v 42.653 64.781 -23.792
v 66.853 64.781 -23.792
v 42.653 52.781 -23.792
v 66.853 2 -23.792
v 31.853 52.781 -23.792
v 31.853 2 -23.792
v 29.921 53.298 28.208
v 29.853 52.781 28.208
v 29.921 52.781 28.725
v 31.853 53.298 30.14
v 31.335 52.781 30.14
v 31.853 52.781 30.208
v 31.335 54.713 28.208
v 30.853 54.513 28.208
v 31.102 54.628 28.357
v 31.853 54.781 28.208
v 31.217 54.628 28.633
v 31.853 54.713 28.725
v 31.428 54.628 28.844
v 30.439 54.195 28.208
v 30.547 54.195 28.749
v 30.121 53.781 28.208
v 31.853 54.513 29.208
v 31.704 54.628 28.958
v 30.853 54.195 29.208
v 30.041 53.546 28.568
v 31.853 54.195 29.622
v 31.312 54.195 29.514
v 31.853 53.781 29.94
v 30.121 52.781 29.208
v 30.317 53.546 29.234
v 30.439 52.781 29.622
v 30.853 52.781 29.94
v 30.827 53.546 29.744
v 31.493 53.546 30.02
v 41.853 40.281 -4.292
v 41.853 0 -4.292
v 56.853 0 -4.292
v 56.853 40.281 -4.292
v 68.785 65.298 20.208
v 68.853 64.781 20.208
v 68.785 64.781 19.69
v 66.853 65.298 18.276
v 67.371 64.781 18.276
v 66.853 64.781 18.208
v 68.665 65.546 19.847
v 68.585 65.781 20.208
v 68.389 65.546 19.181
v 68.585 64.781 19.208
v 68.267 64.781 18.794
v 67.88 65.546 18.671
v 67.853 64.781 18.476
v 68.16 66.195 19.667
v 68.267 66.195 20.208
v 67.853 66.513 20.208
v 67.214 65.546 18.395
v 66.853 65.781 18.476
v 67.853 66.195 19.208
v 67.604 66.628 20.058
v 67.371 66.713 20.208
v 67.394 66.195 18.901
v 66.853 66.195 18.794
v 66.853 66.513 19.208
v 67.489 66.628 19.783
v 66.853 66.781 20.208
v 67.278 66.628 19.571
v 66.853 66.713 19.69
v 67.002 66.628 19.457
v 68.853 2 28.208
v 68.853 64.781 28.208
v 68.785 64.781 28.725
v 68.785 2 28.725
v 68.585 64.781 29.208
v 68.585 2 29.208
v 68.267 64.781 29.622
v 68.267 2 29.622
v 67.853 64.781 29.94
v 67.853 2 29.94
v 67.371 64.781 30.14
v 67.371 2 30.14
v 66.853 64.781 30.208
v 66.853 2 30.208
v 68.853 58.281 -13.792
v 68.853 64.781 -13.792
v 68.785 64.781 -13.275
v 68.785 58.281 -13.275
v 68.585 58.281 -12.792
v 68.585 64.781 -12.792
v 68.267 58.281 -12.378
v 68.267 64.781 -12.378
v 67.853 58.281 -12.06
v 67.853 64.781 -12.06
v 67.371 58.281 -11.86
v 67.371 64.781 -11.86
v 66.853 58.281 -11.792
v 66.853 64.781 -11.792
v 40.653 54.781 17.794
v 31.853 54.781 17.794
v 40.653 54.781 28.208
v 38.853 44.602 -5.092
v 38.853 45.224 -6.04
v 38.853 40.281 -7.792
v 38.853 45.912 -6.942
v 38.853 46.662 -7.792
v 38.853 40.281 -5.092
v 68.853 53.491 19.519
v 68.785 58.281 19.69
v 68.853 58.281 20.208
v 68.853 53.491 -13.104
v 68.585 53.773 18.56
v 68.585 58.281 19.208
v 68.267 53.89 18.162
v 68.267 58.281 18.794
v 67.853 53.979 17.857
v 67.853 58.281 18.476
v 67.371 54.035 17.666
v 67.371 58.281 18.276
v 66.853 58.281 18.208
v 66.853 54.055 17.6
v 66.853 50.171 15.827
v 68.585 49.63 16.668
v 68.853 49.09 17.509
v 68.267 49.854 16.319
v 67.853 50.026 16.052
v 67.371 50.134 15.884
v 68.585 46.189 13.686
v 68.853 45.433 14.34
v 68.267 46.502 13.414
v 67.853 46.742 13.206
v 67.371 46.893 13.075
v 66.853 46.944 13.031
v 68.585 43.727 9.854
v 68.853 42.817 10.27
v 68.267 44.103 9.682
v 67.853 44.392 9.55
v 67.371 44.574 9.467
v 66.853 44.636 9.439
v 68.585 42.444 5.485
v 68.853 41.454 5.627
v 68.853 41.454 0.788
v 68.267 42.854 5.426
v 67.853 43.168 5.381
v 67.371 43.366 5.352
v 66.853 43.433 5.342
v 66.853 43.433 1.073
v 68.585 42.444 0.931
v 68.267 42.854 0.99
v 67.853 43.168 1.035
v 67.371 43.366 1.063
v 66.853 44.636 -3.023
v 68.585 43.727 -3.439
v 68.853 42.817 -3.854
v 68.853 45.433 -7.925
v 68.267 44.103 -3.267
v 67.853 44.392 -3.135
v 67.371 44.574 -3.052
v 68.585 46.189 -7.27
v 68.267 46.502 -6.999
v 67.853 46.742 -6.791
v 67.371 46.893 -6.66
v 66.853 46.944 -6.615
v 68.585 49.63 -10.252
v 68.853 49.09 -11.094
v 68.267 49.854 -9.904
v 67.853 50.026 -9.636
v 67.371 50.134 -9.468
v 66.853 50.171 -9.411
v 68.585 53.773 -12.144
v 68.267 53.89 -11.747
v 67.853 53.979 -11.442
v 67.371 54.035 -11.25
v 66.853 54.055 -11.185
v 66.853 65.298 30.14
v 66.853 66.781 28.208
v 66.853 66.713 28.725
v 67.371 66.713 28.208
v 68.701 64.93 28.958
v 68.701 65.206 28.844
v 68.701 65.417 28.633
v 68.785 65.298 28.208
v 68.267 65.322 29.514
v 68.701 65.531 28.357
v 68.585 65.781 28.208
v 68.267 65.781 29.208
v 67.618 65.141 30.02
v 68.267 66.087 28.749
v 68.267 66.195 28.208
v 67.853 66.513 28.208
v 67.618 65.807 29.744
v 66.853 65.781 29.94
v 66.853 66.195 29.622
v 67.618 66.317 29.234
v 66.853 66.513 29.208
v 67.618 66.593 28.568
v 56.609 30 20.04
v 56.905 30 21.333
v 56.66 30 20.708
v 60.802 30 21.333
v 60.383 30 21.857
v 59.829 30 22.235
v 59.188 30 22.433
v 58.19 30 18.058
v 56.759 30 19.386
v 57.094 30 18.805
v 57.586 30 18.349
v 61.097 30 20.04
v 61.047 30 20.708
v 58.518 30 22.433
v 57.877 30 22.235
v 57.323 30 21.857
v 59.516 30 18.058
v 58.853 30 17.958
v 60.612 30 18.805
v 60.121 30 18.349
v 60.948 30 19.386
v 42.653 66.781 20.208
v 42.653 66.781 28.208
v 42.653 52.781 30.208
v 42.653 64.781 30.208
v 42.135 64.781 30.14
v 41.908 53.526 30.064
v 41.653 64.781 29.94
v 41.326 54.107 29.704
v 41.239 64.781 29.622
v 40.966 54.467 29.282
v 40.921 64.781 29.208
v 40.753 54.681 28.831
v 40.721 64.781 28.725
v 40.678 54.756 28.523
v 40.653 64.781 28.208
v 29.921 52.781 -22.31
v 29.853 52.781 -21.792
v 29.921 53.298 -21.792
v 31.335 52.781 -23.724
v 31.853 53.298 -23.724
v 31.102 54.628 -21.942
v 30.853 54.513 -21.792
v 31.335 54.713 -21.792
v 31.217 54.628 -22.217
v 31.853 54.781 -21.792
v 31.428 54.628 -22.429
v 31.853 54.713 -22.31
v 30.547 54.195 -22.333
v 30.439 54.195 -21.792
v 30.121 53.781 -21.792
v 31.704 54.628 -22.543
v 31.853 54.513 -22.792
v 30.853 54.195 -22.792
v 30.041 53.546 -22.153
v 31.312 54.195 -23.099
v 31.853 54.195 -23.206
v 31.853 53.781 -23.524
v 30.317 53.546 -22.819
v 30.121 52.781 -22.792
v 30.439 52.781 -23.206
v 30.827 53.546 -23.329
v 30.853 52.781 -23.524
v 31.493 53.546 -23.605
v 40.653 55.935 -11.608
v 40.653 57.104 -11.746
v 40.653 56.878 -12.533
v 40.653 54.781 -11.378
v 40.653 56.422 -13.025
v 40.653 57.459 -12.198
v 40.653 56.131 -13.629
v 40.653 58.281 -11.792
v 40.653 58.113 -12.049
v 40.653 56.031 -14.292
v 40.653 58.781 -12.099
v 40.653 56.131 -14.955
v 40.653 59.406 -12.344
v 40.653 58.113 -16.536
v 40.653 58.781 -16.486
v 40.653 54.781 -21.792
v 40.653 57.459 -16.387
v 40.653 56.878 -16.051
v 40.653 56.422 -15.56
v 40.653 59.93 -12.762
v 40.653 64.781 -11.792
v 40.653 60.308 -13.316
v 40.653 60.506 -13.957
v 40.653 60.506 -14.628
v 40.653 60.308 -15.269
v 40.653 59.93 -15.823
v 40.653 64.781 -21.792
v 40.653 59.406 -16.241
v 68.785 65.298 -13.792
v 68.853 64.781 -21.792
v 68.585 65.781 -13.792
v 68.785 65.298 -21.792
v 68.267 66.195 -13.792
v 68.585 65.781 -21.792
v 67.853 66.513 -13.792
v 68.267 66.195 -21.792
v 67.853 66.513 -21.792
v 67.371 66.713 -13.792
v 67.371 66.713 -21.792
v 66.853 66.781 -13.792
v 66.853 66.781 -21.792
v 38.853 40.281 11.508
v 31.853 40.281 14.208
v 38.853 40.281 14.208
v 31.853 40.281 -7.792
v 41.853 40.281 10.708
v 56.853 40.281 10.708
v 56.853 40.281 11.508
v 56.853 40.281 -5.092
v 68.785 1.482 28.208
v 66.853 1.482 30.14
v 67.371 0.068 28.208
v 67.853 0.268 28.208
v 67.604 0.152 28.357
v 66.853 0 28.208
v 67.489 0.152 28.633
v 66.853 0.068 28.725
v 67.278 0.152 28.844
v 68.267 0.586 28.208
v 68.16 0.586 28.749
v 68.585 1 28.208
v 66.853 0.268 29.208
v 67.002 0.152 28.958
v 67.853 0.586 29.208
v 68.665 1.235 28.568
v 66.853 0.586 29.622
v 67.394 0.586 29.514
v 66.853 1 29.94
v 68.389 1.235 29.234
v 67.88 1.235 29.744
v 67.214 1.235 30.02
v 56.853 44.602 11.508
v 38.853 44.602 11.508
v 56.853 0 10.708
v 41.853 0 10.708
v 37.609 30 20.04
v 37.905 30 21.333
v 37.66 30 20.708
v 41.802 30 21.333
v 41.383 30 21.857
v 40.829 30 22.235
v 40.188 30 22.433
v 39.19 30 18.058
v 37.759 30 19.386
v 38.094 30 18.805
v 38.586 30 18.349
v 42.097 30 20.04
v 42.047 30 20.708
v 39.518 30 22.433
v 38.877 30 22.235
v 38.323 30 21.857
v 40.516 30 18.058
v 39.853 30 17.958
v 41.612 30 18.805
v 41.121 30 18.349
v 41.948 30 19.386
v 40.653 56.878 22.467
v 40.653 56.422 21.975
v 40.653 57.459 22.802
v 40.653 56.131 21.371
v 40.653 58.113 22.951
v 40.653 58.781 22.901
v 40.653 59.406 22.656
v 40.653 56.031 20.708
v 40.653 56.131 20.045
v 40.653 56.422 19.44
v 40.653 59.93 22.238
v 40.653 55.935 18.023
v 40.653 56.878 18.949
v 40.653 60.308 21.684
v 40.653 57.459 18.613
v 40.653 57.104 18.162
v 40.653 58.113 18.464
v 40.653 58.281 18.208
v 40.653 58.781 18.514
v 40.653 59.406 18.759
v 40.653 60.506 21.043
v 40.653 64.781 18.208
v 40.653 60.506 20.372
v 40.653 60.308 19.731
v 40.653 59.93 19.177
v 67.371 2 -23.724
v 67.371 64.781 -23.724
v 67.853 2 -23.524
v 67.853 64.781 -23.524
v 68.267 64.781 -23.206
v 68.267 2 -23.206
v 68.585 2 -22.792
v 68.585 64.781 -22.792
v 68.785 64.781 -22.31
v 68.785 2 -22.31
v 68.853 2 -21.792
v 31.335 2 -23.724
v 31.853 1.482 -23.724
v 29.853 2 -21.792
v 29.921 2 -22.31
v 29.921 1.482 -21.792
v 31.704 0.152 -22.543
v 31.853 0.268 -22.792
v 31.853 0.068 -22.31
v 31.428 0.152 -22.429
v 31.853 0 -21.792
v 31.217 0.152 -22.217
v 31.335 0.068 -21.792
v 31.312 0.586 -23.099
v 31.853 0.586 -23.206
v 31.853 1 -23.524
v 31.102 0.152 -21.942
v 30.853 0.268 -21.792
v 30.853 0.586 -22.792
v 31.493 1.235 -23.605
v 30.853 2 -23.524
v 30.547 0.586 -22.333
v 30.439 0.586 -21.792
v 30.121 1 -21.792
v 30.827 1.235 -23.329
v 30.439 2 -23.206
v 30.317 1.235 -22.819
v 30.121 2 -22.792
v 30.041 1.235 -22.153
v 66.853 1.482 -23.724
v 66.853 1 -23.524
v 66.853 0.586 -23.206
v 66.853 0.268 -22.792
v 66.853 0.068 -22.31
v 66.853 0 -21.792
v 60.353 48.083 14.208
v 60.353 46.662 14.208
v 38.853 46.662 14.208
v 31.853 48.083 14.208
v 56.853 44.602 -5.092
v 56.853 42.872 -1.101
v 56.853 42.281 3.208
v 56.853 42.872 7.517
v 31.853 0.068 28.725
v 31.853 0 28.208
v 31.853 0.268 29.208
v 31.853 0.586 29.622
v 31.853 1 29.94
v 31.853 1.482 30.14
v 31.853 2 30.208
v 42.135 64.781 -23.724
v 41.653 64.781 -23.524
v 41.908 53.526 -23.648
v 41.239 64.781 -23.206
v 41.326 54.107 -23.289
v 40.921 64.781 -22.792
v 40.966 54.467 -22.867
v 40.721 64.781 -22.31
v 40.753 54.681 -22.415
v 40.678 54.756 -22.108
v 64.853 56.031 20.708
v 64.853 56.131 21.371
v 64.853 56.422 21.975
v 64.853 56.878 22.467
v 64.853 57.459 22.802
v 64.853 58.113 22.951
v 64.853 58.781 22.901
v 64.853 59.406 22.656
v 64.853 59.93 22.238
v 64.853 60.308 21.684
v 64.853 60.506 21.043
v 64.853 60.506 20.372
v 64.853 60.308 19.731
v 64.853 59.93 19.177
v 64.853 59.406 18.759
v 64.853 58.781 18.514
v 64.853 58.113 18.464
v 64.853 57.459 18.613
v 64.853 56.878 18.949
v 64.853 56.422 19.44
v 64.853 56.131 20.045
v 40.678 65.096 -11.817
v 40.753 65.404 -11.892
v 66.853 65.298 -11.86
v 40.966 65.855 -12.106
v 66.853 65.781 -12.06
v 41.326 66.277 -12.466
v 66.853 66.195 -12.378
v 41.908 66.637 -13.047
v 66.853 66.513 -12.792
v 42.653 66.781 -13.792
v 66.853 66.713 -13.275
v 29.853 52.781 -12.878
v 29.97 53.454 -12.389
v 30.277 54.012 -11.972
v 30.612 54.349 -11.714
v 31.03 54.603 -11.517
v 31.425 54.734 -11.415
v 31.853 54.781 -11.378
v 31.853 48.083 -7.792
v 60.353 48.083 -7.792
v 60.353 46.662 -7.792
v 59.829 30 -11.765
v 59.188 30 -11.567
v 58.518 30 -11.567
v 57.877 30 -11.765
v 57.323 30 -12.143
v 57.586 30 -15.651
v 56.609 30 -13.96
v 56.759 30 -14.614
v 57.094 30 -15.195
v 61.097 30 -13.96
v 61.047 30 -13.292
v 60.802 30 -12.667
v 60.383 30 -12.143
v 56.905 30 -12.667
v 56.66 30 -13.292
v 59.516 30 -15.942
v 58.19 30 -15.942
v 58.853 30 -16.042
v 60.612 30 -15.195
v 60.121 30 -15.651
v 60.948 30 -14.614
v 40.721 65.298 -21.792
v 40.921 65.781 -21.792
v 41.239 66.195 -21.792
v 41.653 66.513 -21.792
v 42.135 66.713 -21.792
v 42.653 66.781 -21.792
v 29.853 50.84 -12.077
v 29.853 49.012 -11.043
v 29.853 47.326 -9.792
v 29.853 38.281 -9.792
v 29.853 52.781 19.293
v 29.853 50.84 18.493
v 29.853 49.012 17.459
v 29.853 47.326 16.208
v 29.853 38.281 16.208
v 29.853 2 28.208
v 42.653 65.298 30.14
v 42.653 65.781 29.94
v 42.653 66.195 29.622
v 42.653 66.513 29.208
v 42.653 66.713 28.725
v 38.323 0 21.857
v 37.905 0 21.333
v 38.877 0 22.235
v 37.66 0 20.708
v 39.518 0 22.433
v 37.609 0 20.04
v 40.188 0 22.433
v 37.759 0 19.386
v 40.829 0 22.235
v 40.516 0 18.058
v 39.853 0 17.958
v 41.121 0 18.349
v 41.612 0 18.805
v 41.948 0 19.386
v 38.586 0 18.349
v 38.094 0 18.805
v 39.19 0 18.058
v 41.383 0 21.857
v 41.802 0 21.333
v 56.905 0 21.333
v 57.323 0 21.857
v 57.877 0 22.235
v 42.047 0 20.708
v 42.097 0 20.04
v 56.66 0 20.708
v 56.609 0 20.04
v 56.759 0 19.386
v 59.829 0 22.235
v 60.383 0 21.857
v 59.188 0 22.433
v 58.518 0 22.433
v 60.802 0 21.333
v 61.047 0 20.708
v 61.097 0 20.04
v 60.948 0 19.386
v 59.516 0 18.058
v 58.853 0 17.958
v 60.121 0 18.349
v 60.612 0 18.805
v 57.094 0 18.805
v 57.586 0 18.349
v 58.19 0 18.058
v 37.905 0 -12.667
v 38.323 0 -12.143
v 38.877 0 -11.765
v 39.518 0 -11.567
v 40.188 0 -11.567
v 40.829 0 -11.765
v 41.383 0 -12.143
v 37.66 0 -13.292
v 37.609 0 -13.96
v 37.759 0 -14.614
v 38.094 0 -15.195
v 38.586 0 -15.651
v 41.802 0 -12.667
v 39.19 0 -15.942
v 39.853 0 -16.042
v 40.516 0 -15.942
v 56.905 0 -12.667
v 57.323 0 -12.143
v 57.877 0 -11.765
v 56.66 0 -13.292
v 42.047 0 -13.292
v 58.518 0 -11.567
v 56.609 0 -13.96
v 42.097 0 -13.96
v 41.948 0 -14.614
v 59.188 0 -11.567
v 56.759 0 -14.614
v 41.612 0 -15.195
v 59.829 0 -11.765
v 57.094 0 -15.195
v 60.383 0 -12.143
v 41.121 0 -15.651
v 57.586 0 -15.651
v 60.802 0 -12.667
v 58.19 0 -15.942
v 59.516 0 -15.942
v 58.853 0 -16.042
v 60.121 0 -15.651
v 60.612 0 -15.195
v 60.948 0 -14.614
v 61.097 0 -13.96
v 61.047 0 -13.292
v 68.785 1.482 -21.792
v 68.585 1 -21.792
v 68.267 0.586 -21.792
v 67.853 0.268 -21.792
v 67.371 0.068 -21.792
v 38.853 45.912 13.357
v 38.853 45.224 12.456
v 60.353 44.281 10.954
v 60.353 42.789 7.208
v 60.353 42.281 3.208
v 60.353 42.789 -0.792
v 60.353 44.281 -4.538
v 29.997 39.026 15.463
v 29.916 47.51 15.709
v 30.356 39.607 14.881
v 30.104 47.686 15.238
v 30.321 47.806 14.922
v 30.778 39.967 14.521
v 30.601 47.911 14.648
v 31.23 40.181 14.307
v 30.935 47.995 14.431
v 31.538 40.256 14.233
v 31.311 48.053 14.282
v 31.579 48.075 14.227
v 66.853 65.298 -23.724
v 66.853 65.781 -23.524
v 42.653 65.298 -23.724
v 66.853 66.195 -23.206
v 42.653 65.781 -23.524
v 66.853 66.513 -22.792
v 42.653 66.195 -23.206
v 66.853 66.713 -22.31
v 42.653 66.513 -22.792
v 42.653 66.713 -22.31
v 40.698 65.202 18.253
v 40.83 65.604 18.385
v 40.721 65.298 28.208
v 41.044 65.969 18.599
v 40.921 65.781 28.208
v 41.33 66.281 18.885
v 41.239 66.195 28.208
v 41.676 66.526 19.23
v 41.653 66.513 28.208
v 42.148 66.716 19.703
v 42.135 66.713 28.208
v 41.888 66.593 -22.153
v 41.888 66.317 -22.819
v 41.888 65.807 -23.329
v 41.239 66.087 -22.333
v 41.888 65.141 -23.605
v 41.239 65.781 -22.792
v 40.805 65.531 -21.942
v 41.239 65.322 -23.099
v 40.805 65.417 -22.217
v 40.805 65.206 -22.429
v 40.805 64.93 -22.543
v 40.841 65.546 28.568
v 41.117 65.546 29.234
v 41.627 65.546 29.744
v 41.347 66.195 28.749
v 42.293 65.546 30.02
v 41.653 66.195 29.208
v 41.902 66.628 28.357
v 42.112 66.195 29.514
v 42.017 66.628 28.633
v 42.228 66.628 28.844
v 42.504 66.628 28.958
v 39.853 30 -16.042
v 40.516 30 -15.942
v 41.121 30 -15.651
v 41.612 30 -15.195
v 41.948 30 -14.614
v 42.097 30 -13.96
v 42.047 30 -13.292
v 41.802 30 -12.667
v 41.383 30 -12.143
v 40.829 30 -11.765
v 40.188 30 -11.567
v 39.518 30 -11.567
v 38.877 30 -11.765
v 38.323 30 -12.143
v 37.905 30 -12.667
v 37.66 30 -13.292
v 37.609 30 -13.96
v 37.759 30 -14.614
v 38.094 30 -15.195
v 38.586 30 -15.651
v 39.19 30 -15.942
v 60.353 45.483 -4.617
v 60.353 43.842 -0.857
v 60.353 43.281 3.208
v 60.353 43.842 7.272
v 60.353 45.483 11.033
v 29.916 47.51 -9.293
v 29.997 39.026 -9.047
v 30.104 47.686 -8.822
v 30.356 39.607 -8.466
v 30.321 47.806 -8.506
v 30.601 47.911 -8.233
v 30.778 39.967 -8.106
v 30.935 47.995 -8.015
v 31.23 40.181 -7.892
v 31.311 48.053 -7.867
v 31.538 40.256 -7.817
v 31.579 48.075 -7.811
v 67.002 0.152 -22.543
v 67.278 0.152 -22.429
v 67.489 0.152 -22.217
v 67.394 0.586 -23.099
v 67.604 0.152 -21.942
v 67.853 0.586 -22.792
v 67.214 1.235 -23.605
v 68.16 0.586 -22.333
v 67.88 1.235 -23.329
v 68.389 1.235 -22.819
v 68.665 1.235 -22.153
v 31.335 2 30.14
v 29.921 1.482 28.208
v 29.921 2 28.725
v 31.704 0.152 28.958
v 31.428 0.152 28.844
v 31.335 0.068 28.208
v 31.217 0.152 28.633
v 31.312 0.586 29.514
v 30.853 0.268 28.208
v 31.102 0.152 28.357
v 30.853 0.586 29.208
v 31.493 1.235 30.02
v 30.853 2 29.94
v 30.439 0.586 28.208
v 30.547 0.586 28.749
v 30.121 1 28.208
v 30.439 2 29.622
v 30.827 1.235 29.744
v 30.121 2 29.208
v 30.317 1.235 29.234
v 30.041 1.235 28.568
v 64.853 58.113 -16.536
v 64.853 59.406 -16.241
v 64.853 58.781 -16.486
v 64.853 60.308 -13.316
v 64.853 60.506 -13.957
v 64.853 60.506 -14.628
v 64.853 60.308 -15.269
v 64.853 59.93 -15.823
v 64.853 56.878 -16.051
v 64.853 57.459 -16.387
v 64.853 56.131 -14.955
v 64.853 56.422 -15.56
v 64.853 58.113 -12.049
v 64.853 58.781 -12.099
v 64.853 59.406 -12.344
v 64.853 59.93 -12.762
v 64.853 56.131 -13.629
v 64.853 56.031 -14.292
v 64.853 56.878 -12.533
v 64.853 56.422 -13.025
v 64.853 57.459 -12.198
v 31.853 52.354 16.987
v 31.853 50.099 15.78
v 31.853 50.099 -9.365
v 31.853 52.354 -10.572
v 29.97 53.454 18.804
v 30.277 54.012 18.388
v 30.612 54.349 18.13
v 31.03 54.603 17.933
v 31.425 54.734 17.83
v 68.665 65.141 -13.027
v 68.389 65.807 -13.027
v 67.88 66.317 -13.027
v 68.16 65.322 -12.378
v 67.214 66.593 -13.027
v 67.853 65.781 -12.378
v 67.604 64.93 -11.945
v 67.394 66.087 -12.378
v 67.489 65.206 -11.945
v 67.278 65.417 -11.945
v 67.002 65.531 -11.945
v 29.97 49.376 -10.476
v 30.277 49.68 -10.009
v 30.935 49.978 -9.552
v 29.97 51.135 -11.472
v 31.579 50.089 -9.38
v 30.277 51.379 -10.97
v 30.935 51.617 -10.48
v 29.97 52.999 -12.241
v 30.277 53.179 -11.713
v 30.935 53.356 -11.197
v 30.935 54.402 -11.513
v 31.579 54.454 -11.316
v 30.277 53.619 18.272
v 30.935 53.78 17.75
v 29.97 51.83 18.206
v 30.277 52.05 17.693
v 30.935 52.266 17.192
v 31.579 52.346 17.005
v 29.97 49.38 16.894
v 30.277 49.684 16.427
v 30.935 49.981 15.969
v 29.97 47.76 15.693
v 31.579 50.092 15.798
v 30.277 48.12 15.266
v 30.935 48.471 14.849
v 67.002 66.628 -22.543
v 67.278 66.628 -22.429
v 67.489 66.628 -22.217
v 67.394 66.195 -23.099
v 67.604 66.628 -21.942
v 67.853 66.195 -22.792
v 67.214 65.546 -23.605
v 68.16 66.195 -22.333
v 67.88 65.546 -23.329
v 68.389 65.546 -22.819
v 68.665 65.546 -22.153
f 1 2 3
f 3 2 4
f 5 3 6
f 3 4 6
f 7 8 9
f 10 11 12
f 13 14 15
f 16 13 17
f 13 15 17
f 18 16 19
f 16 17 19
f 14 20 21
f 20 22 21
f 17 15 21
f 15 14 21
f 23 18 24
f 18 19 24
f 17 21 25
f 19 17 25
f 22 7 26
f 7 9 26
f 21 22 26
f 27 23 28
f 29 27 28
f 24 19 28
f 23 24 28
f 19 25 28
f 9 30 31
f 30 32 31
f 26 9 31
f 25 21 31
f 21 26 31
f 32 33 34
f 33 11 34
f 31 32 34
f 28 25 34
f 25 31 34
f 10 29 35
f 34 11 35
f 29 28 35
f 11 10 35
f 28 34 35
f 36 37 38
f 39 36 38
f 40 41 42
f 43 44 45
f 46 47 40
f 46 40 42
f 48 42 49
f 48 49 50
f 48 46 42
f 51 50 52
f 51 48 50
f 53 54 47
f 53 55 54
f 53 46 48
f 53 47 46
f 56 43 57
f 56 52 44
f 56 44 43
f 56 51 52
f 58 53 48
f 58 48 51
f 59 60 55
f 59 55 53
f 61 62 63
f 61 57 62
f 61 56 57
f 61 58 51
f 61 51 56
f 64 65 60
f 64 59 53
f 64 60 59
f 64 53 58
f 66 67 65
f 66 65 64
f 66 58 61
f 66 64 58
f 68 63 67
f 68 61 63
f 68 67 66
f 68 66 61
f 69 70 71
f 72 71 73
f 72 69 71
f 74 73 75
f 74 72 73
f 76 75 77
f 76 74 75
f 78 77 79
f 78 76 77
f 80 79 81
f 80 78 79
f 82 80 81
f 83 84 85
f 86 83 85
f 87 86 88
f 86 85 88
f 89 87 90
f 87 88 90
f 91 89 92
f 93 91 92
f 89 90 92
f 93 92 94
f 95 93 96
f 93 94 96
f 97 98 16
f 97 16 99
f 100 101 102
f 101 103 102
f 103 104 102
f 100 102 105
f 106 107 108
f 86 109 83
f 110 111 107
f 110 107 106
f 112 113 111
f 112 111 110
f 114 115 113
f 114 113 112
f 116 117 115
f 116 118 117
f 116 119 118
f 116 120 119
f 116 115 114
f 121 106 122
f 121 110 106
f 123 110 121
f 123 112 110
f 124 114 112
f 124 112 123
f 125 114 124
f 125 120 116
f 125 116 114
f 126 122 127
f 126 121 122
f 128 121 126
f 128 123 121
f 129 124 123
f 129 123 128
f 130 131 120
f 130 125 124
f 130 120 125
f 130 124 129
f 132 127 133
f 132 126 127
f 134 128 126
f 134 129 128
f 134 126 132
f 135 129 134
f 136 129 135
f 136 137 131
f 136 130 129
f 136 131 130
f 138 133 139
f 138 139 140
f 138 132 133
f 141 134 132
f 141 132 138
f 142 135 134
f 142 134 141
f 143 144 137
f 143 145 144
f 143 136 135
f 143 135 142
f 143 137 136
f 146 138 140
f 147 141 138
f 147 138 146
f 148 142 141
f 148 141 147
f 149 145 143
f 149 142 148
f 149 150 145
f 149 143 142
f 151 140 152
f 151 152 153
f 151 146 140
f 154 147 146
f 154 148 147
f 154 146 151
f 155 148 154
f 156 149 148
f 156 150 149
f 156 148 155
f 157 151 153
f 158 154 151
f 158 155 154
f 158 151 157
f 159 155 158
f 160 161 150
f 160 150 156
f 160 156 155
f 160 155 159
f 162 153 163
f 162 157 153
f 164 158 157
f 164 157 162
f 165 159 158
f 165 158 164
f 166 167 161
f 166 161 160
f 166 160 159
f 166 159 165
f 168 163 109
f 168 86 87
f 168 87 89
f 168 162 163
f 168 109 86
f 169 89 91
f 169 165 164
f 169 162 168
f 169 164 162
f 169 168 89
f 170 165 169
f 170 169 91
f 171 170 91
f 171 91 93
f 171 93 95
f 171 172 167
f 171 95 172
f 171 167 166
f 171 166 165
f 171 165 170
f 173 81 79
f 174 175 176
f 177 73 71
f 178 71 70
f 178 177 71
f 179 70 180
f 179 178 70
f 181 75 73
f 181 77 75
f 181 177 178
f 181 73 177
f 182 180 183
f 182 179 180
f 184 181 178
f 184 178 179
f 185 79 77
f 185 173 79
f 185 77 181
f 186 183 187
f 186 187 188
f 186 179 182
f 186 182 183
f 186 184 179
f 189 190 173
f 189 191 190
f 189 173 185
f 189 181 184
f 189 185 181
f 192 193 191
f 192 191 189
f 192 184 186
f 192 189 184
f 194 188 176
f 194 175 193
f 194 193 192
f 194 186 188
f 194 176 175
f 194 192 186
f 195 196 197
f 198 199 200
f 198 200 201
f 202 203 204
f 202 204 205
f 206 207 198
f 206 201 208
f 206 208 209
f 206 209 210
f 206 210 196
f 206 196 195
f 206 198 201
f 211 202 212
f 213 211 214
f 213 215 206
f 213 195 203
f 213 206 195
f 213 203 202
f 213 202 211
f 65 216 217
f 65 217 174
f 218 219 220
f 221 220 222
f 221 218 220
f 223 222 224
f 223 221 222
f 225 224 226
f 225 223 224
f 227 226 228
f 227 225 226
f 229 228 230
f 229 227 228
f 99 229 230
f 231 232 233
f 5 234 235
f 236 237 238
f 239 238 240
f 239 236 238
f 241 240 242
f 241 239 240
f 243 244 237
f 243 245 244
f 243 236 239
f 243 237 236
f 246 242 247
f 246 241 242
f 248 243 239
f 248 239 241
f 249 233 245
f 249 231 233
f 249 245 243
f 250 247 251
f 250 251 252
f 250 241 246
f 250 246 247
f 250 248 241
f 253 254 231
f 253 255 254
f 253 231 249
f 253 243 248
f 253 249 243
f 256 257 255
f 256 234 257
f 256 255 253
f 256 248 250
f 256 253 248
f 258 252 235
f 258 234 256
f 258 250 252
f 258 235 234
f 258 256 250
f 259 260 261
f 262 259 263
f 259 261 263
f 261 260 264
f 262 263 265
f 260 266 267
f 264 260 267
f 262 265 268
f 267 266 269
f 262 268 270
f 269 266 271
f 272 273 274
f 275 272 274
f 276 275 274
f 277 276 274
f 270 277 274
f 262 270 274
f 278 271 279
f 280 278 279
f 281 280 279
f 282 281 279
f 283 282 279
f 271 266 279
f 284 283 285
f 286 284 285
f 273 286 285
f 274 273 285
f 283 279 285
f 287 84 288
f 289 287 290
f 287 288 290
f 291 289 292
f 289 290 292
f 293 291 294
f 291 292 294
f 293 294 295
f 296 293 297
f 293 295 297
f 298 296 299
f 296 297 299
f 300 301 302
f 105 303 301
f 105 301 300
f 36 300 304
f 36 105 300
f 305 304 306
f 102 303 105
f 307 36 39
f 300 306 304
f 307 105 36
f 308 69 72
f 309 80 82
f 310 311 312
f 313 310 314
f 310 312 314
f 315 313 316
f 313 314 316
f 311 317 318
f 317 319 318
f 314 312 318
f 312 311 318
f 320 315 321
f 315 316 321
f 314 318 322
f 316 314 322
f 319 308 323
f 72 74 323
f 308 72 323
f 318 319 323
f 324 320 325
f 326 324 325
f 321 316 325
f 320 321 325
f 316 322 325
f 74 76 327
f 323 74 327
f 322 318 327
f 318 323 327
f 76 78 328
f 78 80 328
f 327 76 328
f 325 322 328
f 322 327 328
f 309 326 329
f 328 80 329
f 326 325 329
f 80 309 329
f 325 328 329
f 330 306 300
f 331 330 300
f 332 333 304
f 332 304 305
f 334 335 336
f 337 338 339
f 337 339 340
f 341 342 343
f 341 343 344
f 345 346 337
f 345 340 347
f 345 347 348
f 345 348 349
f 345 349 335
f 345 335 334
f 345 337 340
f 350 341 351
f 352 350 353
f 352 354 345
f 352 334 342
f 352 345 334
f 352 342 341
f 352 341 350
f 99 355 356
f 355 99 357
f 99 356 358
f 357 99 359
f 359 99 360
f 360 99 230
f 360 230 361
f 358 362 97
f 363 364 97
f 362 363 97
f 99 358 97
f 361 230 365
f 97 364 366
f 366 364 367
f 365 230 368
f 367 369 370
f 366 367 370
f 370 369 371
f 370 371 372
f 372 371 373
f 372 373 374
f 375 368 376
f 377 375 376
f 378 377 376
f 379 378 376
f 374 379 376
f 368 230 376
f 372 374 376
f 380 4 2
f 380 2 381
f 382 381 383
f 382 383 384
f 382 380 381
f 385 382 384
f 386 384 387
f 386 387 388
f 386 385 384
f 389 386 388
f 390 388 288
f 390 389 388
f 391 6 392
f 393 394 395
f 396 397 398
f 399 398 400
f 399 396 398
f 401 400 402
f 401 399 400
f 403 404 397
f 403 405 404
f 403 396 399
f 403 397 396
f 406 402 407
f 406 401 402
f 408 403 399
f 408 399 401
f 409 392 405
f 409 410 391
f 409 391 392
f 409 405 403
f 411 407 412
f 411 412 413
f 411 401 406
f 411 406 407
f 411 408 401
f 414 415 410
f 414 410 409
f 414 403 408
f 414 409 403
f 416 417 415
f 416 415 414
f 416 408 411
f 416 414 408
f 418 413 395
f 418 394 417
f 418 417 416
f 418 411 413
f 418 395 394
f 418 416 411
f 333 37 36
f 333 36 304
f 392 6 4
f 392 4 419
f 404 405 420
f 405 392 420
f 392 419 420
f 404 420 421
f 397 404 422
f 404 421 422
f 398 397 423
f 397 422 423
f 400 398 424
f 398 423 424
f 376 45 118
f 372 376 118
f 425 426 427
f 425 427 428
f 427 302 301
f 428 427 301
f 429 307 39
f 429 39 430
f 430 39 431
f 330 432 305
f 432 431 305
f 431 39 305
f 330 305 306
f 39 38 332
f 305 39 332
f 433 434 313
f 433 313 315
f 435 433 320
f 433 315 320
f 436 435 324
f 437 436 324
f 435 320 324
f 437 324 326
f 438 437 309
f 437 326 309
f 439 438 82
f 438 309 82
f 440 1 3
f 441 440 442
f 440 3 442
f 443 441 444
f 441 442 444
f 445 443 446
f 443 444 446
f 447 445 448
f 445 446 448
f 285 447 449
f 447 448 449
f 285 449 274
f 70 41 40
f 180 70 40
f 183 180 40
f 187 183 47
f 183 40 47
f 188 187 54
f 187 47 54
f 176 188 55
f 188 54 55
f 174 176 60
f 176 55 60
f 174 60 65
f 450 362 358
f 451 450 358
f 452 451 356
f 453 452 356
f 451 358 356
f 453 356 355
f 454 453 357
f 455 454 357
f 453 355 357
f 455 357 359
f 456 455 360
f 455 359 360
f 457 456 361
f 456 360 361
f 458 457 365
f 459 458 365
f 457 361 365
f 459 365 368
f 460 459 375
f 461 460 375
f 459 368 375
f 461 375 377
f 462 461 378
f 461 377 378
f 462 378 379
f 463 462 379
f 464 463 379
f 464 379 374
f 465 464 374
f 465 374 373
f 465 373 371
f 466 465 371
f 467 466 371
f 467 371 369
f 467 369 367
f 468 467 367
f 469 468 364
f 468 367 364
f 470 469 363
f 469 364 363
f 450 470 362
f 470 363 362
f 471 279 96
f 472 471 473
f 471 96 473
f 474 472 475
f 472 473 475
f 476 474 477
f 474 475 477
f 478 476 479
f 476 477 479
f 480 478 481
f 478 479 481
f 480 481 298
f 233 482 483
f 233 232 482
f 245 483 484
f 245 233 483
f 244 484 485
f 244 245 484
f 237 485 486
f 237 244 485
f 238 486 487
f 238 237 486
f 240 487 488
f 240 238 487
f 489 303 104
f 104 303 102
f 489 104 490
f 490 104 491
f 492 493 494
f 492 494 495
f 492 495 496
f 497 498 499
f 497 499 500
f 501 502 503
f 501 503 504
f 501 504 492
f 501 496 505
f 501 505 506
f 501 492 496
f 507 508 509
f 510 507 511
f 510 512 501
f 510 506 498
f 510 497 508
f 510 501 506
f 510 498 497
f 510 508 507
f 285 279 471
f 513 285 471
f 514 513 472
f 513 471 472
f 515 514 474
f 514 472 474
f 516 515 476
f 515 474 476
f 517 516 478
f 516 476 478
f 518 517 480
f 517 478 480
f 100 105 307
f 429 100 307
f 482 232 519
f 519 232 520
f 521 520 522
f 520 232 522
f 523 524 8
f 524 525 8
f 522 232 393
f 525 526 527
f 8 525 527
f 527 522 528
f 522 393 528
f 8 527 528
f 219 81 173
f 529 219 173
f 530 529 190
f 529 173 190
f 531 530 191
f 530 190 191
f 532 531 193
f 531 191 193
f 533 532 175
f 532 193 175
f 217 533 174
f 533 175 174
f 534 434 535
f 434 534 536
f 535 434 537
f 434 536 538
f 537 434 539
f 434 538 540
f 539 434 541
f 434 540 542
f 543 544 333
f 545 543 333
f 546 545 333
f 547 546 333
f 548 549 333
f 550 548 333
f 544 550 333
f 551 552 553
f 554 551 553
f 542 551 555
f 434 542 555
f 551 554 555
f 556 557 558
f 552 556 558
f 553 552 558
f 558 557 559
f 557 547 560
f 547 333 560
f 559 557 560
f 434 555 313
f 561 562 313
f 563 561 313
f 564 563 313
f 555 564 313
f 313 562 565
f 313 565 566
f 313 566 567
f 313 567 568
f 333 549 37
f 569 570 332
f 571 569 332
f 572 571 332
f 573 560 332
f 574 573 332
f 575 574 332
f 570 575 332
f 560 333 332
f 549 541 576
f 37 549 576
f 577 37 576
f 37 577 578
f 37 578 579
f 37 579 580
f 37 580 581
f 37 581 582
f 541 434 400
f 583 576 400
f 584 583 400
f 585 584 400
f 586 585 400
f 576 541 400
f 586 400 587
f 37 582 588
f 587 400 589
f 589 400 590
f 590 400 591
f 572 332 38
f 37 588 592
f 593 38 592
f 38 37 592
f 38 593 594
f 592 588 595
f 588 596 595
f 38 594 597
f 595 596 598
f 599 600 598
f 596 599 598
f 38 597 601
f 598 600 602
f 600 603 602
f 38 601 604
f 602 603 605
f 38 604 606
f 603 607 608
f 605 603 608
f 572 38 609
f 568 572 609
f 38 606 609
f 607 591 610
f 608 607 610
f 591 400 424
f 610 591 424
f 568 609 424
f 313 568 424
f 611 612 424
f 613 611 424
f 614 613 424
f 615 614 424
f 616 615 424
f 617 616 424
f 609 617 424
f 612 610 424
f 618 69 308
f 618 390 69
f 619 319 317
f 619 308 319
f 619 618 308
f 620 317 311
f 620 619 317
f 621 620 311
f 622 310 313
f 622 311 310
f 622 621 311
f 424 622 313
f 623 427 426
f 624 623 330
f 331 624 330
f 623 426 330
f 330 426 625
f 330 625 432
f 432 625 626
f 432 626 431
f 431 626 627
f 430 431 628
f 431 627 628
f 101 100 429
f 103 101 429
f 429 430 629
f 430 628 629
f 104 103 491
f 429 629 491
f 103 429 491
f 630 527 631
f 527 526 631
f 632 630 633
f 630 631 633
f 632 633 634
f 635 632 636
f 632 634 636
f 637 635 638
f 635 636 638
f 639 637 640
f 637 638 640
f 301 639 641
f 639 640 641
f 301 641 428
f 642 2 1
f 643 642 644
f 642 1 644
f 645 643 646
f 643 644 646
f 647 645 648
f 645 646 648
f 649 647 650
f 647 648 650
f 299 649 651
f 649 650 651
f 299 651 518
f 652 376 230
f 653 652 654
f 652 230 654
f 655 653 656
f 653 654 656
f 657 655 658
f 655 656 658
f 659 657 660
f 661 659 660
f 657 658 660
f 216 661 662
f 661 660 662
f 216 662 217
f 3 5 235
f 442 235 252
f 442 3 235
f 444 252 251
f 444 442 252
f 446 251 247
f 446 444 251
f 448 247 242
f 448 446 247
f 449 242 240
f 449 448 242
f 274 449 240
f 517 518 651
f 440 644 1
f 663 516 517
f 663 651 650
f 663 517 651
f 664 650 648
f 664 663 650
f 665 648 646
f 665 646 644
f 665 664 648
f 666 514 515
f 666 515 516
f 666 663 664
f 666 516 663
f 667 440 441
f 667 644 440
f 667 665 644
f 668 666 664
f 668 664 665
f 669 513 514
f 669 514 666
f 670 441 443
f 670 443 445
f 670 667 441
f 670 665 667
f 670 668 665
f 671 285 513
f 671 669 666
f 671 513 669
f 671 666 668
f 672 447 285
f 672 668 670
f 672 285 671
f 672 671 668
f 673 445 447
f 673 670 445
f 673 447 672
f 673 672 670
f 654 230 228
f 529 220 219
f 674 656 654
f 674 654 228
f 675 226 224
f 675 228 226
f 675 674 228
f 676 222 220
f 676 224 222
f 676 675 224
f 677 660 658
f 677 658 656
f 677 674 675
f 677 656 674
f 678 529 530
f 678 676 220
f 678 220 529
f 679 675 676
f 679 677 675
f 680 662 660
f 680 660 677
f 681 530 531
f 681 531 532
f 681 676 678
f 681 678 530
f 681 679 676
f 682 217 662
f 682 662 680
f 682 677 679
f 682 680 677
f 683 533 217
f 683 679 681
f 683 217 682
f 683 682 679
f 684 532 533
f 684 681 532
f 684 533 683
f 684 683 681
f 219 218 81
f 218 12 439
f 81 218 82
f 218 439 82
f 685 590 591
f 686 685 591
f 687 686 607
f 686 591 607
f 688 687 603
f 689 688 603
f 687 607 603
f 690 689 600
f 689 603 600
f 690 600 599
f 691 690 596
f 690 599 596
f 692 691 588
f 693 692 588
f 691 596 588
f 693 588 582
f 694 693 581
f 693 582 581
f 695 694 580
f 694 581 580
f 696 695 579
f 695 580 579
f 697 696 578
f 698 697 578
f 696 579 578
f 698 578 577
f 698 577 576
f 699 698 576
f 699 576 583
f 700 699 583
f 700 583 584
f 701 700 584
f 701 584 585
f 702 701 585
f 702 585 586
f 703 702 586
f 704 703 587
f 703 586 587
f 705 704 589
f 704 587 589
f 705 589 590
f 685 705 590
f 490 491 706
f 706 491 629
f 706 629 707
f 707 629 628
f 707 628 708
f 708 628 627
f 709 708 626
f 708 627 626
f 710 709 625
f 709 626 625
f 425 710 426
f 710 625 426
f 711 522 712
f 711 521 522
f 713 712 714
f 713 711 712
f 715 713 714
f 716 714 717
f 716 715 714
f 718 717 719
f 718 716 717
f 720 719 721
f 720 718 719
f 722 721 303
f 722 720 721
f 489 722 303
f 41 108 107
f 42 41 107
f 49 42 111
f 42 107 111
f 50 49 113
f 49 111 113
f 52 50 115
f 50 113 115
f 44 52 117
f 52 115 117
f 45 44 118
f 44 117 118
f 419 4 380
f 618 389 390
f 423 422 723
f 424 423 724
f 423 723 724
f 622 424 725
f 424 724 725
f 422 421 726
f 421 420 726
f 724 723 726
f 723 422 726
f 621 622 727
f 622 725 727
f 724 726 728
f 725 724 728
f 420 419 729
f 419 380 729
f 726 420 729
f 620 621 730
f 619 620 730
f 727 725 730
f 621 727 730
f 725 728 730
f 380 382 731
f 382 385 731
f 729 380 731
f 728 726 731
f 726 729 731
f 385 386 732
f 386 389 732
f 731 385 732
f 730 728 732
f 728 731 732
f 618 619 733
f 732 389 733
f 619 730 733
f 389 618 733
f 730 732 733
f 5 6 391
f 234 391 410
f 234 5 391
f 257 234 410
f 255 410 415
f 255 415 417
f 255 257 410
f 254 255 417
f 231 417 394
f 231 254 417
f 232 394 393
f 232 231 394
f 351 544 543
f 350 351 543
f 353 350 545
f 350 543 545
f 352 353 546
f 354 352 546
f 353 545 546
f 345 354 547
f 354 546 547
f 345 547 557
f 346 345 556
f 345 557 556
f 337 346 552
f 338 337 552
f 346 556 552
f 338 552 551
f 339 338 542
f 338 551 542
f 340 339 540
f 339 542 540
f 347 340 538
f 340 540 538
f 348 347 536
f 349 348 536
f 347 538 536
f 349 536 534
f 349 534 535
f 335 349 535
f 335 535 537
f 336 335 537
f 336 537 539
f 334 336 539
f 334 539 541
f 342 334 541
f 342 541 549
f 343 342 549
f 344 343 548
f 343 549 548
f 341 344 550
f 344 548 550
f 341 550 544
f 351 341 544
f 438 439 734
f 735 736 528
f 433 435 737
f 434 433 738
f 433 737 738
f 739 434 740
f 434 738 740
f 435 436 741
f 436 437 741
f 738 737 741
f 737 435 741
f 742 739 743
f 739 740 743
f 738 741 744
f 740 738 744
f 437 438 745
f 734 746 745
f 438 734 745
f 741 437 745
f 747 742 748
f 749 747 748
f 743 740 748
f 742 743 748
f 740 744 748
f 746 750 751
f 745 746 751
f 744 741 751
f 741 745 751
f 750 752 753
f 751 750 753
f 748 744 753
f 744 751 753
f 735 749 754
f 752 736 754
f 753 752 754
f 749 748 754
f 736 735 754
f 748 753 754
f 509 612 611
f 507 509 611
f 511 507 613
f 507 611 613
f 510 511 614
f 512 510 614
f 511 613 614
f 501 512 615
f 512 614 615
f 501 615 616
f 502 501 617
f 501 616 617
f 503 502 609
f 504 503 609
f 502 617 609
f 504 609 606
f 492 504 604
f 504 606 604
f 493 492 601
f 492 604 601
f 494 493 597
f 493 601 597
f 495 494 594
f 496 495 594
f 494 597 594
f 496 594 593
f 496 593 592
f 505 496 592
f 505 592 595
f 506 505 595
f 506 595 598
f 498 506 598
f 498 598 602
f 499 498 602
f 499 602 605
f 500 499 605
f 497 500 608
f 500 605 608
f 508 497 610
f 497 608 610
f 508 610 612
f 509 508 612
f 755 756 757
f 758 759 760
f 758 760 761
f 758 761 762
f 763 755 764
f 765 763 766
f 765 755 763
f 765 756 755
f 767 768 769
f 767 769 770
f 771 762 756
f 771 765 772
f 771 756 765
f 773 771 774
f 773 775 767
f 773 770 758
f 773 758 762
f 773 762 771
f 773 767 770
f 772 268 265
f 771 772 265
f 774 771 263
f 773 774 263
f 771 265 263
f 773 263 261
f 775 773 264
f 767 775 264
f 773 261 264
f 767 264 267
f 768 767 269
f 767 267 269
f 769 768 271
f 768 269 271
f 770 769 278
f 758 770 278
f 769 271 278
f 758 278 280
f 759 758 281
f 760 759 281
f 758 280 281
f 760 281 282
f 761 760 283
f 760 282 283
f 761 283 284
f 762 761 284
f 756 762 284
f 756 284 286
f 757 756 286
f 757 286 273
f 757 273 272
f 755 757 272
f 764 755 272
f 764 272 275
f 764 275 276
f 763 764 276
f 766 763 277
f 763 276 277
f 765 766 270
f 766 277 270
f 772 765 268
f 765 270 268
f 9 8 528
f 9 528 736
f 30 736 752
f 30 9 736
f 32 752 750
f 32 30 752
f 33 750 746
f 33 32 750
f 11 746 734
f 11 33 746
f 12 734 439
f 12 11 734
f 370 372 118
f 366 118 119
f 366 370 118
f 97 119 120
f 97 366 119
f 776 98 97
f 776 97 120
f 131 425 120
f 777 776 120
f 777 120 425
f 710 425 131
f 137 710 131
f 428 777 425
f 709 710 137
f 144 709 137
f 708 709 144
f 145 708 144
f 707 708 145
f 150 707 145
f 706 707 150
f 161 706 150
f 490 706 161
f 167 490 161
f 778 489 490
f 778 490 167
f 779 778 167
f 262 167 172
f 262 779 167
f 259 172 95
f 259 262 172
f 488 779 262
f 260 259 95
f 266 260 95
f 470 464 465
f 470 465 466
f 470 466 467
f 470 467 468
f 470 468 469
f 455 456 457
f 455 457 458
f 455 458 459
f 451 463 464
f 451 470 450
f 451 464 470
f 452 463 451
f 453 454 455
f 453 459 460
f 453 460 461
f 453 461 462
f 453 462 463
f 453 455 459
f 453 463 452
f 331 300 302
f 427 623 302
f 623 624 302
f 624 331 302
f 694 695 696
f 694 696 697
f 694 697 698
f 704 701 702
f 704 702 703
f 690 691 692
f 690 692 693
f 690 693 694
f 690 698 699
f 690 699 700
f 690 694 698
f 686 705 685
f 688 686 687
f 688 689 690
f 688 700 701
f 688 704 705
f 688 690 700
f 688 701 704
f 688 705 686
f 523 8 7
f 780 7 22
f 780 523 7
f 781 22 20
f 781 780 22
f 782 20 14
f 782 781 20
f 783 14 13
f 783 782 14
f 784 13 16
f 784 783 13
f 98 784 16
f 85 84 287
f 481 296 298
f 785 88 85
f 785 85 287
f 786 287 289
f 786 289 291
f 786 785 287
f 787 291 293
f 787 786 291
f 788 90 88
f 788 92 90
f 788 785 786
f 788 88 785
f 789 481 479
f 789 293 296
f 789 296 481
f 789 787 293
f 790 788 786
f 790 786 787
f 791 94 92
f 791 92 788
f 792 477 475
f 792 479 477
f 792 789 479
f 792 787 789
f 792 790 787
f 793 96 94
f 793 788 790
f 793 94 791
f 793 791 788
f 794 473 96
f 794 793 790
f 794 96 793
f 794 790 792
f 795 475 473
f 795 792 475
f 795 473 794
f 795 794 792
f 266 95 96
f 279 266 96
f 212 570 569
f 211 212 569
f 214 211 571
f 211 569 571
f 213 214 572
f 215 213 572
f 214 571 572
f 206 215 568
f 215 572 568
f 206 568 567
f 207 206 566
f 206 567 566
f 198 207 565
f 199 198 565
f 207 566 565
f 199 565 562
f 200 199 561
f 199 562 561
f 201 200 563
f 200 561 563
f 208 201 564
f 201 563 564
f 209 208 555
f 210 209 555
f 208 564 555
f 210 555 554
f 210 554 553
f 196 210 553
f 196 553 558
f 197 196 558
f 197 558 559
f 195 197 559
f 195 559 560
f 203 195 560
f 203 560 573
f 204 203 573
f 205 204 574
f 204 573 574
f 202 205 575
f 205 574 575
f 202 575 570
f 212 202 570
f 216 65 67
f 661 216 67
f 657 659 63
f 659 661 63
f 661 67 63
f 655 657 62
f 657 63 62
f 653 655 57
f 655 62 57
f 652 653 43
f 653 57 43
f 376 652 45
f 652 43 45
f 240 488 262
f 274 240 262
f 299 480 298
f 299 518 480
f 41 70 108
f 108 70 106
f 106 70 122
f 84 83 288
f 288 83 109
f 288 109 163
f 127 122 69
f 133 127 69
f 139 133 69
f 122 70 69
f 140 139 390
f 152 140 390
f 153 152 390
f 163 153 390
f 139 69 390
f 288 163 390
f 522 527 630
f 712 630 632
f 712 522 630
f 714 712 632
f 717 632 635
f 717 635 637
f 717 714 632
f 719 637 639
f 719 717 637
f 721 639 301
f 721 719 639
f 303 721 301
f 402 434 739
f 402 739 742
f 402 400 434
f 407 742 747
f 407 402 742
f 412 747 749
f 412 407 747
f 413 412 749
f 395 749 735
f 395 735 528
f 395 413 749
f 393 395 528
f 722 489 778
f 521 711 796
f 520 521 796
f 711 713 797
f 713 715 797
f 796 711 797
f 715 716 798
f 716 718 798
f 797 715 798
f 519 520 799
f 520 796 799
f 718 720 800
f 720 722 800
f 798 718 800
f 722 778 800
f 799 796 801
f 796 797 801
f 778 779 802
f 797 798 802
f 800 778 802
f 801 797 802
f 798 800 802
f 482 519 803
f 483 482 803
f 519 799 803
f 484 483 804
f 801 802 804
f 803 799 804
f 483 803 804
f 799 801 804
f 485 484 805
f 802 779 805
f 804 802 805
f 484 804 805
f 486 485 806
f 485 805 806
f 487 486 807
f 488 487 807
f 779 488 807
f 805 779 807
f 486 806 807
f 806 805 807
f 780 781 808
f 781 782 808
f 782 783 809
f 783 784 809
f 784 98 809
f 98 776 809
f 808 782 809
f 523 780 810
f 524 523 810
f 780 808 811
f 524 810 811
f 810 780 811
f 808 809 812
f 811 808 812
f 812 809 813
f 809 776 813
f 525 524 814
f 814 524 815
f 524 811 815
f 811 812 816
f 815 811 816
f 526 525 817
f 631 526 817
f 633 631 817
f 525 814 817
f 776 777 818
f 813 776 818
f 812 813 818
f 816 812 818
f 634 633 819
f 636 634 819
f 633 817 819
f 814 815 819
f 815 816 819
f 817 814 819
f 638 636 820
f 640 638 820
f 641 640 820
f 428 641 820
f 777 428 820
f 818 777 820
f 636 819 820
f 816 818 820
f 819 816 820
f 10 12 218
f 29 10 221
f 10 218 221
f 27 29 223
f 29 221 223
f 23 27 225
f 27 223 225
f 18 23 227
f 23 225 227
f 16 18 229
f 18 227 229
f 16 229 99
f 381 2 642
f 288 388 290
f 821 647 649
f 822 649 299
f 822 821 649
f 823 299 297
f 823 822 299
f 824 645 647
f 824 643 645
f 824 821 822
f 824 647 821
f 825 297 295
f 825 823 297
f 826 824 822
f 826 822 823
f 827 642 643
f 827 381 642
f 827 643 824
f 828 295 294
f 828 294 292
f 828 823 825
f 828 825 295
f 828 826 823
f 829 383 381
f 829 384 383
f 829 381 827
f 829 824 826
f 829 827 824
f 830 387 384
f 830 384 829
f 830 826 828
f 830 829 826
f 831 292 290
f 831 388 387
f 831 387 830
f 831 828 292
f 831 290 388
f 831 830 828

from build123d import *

# Parameters (mm, degrees)
CROQUIS18_W                  = 39
CROQUIS18_H                  = 54
SALIENTE_EXTRUIR8_DEPTH      = 40.280661595
SALIENTE_EXTRUIR9_REACH      = 87.298
SALIENTE_EXTRUIR9_END_RADIUS = 16
SALIENTE_EXTRUIR10_DEPTH     = 26.5
CORTAR_EXTRUIR8_START        = -39
CROQUIS22_R                  = 15
CORTAR_EXTRUIR8_DEPTH        = 39
CORTAR_EXTRUIR9_DEPTH        = 84.025081472
CROQUIS24_W                  = 10.8
CROQUIS24_H                  = 54
CORTAR_EXTRUIR10_DEPTH       = 12
CROQUIS25_R                  = 2.25
CORTAR_EXTRUIR11_DEPTH       = 24.2
REDONDEO1_R                  = 2
REDONDEO2_R                  = 2
CROQUIS26_R                  = 2.25
CORTAR_EXTRUIR12_DEPTH       = 30
CROQUIS27_W                  = 15
CROQUIS27_H                  = 15
CORTAR_EXTRUIR13_DEPTH       = 101.562974791


with BuildPart() as part:
    # Croquis18 → Saliente-Extruir8 (new body)
    with BuildSketch(Plane(origin=(0, 0, 0), x_dir=(1, 0, 0), z_dir=(0, 1, 0))):
        with Locations((49.353088131, -3.207737261)):
            Rectangle(CROQUIS18_W, CROQUIS18_H)
    extrude(amount=SALIENTE_EXTRUIR8_DEPTH)

    # Saliente-Extruir9: up to this cylinder (the profile starts outside it)
    saliente_extruir9_end = Plane(origin=(39.1607, 58.280661595, 3.207737261), z_dir=(1, 0, 0)) * Cylinder(SALIENTE_EXTRUIR9_END_RADIUS, 207.596, mode=Mode.PRIVATE)
    # Croquis20 → Saliente-Extruir9 (add, up to the surface)
    with BuildSketch(Plane(origin=(0, 40.280661595, 0), x_dir=(1, 0, 0), z_dir=(0, 1, 0)), mode=Mode.PRIVATE) as saliente_extruir9_sk1:
        Polygon((38.853088131, -11.507737261), (38.853088131, -14.207737261), (60.353088131, -14.207737261), (60.353088131, 7.792262739), (38.853088131, 7.792262739), (38.853088131, 5.092262739), (56.853088131, 5.092262739), (56.853088131, -11.507737261), align=None)
    saliente_extruir9_tool1 = extrude(saliente_extruir9_sk1.sketch, amount=SALIENTE_EXTRUIR9_REACH, mode=Mode.PRIVATE) - saliente_extruir9_end
    add(saliente_extruir9_tool1.solids().sort_by_distance((39.1607, 40.280662, 12.857737))[0])

    # Croquis21 → Saliente-Extruir10 (add)
    with BuildSketch(Plane(origin=(0, 40.280661595, 0), x_dir=(1, 0, 0), z_dir=(0, 1, 0))):
        Polygon((68.853088131, 23.792262739), (29.853088131, 23.792262739), (29.853088131, 7.792262739), (60.353088131, 7.792262739), (60.353088131, -14.207737261), (29.853088131, -14.207737261), (29.853088131, -30.207737261), (68.853088131, -30.207737261), align=None)
    extrude(amount=SALIENTE_EXTRUIR10_DEPTH)

    # Croquis22 → Cortar-Extruir8 (cut)
    with BuildSketch(Plane(origin=(68.853088131, 0, 0), x_dir=(0, 0, -1), z_dir=(1, 0, 0)).offset(CORTAR_EXTRUIR8_START)):
        with Locations((-3.207737261, 58.280661595)):
            Circle(CROQUIS22_R)
    extrude(amount=CORTAR_EXTRUIR8_DEPTH, mode=Mode.SUBTRACT)

    # Croquis23 → Cortar-Extruir9 (cut, through all)
    with BuildSketch(Plane(origin=(68.853088131, 0, 0), x_dir=(0, 0, -1), z_dir=(1, 0, 0))):
        with BuildLine():
            Line((-15.566944355, 66.780661595), (-18.207737261, 66.780661595))
            Line((-18.207737261, 66.780661595), (-18.207737261, 58.280661595))
            ThreePointArc((-18.207737261, 58.280661595), (-17.532333353, 62.731048859), (-15.566944355, 66.780661595))
        make_face()
        with BuildLine():
            ThreePointArc((9.151469833, 66.780661595), (11.116858831, 62.731048859), (11.792262739, 58.280661595))
            Line((11.792262739, 58.280661595), (11.792262739, 66.780661595))
            Line((11.792262739, 66.780661595), (9.151469833, 66.780661595))
        make_face()
    extrude(amount=-CORTAR_EXTRUIR9_DEPTH, mode=Mode.SUBTRACT)

    # Croquis24 → Cortar-Extruir10 (cut)
    with BuildSketch(Plane(origin=(0, 66.780661595, 0), x_dir=(1, 0, 0), z_dir=(0, 1, 0))):
        with Locations((35.253088131, -3.207737261)):
            Rectangle(CROQUIS24_W, CROQUIS24_H)
    extrude(amount=-CORTAR_EXTRUIR10_DEPTH, mode=Mode.SUBTRACT)

    # Croquis25 → Cortar-Extruir11 (cut)
    with BuildSketch(Plane.ZY.offset(-40.653088131)):
        with Locations(Location((20.707737261, 58.280661595, 0), (0, 0, 270))):
            Circle(CROQUIS25_R)
        with Locations(Location((-14.292262739, 58.280661595, 0), (0, 0, 270))):
            Circle(CROQUIS25_R)
    extrude(amount=-CORTAR_EXTRUIR11_DEPTH, mode=Mode.SUBTRACT)

    # Redondeo1
    redondeo1_edges = [part.edges().sort_by_distance(p)[0] for p in [
        (68.853088131, 62.530661595, 18.207737261),
        (68.853088131, 62.530661595, -11.792262739),
        (68.853088131, 33.390330798, -23.792262739),
        (54.753088131, 66.780661595, 30.207737261),
        (29.853088131, 27.390330798, 30.207737261),
        (68.853088131, 33.390330798, 30.207737261),
        (29.853088131, 27.390330798, -23.792262739),
        (29.853088131, 51.200842989, -10.016338076),
        (29.853088131, 54.780661595, -17.585238812),
        (29.853088131, 54.780661595, 24.000713334),
        (40.653088131, 60.780661595, -23.792262739),
        (35.253088131, 54.780661595, -23.792262739),
        (35.253088131, 54.780661595, 30.207737261),
        (40.653088131, 60.780661595, 30.207737261),
        (29.853088131, 40.280661595, 3.207737261),
        (49.353088131, 0, -23.792262739),
        (68.853088131, 0, 3.207737261),
        (68.853088131, 66.780661595, 24.207737261),
        (54.753088131, 66.780661595, -23.792262739),
        (49.353088131, 0, 30.207737261),
        (29.853088131, 0, 3.207737261),
        (29.853088131, 44.181642082, -7.792262739),
        (29.853088131, 44.181642082, 14.207737261),
        (29.853088131, 51.200842989, 16.431812597),
        (68.853088131, 43.280661596, 3.207737261),
        (68.853088131, 66.780661595, -17.792262739),
    ]]
    fillet(redondeo1_edges, radius=REDONDEO1_R)

    # Redondeo2
    # the kernel refuses this fillet: 2 mm, written as the material it takes off along each edge
    with BuildSketch(Plane(origin=(66.853088131, 64.780661595, -13.792262739), x_dir=(0, 1, 0), z_dir=(0, 0, 1))) as redondeo2_piece_1_section:
        Polygon((0, 0), (REDONDEO2_R, 0), (REDONDEO2_R, -REDONDEO2_R), (0, -REDONDEO2_R), align=None)
    redondeo2_piece_1 = extrude(amount=REDONDEO2_R, mode=Mode.PRIVATE)
    redondeo2_piece_1 = redondeo2_piece_1 - Plane(origin=(66.853088131, 64.780661595, -13.792262739), x_dir=(-0.7071067811865475, -0.7071067811865476, 0), z_dir=(0, 0, 1)) * Sphere(REDONDEO2_R, mode=Mode.PRIVATE)
    add(redondeo2_piece_1, mode=Mode.SUBTRACT)
    with BuildSketch(Plane(origin=(66.853088131, 64.780661595, 20.207737261), x_dir=(0, 0, -1), z_dir=(0, 1, 0))) as redondeo2_piece_2_section:
        Polygon((0, 0), (REDONDEO2_R, 0), (REDONDEO2_R, -REDONDEO2_R), (0, -REDONDEO2_R), align=None)
    redondeo2_piece_2 = extrude(amount=REDONDEO2_R, mode=Mode.PRIVATE)
    redondeo2_piece_2 = redondeo2_piece_2 - Plane(origin=(66.853088131, 64.780661595, 20.207737261), x_dir=(-0.7071067811865475, 0, 0.7071067811865475), z_dir=(0, 1, 0)) * Sphere(REDONDEO2_R, mode=Mode.PRIVATE)
    add(redondeo2_piece_2, mode=Mode.SUBTRACT)
    with BuildSketch(Plane(origin=(42.653088131, 64.780661595, -21.792262739), x_dir=(0, 1, 0), z_dir=(-1, 0, 0))) as redondeo2_piece_3_section:
        Polygon((0, 0), (REDONDEO2_R, 0), (REDONDEO2_R, REDONDEO2_R), (0, REDONDEO2_R), align=None)
    redondeo2_piece_3 = extrude(amount=REDONDEO2_R, mode=Mode.PRIVATE)
    redondeo2_piece_3 = redondeo2_piece_3 - Plane(origin=(42.653088131, 64.780661595, -21.792262739), x_dir=(0, -0.7071067811865475, 0.7071067811865475), z_dir=(-1, 0, 0)) * Sphere(REDONDEO2_R, mode=Mode.PRIVATE)
    add(redondeo2_piece_3, mode=Mode.SUBTRACT)
    with BuildSketch(Plane(origin=(42.653088131, 64.780661595, 28.207737261), x_dir=(-1, 0, 0), z_dir=(0, 1, 0))) as redondeo2_piece_4_section:
        Polygon((0, 0), (REDONDEO2_R, 0), (REDONDEO2_R, REDONDEO2_R), (0, REDONDEO2_R), align=None)
    redondeo2_piece_4 = extrude(amount=REDONDEO2_R, mode=Mode.PRIVATE)
    redondeo2_piece_4 = redondeo2_piece_4 - Plane(origin=(42.653088131, 64.780661595, 28.207737261), x_dir=(0.7071067811865475, 0, -0.7071067811865476), z_dir=(0, 1, 0)) * Sphere(REDONDEO2_R, mode=Mode.PRIVATE)
    add(redondeo2_piece_4, mode=Mode.SUBTRACT)
    with BuildSketch(Plane(origin=(66.853088131, 66.780661595, 18.207737261), x_dir=(0, -1.5546675058430992e-10, 1.0), z_dir=(-1, 0, 0)), Plane(origin=(66.853088131, 66.780661595, -11.792262739), x_dir=(0, -1, 0), z_dir=(-1, 0, 0))) as redondeo2_piece_5:
        with BuildLine():
            CenterArc((REDONDEO2_R, -REDONDEO2_R), REDONDEO2_R, 90.000000009, 90)
            Line((REDONDEO2_R * 1.55466750608e-10, -REDONDEO2_R), (0, 0))
            Line((0, 0), (REDONDEO2_R, 0))
        make_face()
    extrude(amount=31.200000001, mode=Mode.SUBTRACT)
    with BuildSketch(Plane(origin=(40.653088131, 66.780661595, -6.792262738), x_dir=(0, -1, 0), z_dir=(0, 0, -1))) as redondeo2_piece_6:
        with BuildLine():
            CenterArc((REDONDEO2_R, -REDONDEO2_R), REDONDEO2_R, 90, 90)
            Line((0, -REDONDEO2_R), (0, 0))
            Line((0, 0), (REDONDEO2_R, 0))
        make_face()
    extrude(amount=15.000000001, mode=Mode.SUBTRACT)
    with BuildSketch(Plane(origin=(40.653088131, 66.780661595, 28.207737261), x_dir=(1.0, -1.5546675058430992e-10, 0), z_dir=(0, 0, -1))) as redondeo2_piece_7:
        with BuildLine():
            CenterArc((REDONDEO2_R, REDONDEO2_R), REDONDEO2_R, 179.999999991, 90)
            Line((REDONDEO2_R * 1.55466750608e-10, REDONDEO2_R), (0, 0))
            Line((0, 0), (REDONDEO2_R, 0))
        make_face()
    extrude(amount=15.000000001, mode=Mode.SUBTRACT)

    # Croquis26 → Cortar-Extruir12 (cut)
    with BuildSketch(Plane.XZ):
        with Locations(Location((39.853088131, 20.207737261, 0), (0, 0, 270))):
            Circle(CROQUIS26_R)
        with Locations(Location((58.853088131, 20.207737261, 0), (0, 0, 270))):
            Circle(CROQUIS26_R)
        with Locations(Location((39.853088131, -13.792262739, 0), (0, 0, 270))):
            Circle(CROQUIS26_R)
        with Locations(Location((58.853088131, -13.792262739, 0), (0, 0, 270))):
            Circle(CROQUIS26_R)
    extrude(amount=-CORTAR_EXTRUIR12_DEPTH, mode=Mode.SUBTRACT)

    # Croquis27 → Cortar-Extruir13 (cut, through all)
    with BuildSketch(Plane.XZ):
        with Locations((49.353088131, 3.207737261)):
            Rectangle(CROQUIS27_W, CROQUIS27_H)
    extrude(amount=-CORTAR_EXTRUIR13_DEPTH, mode=Mode.SUBTRACT)


solid = part.part
